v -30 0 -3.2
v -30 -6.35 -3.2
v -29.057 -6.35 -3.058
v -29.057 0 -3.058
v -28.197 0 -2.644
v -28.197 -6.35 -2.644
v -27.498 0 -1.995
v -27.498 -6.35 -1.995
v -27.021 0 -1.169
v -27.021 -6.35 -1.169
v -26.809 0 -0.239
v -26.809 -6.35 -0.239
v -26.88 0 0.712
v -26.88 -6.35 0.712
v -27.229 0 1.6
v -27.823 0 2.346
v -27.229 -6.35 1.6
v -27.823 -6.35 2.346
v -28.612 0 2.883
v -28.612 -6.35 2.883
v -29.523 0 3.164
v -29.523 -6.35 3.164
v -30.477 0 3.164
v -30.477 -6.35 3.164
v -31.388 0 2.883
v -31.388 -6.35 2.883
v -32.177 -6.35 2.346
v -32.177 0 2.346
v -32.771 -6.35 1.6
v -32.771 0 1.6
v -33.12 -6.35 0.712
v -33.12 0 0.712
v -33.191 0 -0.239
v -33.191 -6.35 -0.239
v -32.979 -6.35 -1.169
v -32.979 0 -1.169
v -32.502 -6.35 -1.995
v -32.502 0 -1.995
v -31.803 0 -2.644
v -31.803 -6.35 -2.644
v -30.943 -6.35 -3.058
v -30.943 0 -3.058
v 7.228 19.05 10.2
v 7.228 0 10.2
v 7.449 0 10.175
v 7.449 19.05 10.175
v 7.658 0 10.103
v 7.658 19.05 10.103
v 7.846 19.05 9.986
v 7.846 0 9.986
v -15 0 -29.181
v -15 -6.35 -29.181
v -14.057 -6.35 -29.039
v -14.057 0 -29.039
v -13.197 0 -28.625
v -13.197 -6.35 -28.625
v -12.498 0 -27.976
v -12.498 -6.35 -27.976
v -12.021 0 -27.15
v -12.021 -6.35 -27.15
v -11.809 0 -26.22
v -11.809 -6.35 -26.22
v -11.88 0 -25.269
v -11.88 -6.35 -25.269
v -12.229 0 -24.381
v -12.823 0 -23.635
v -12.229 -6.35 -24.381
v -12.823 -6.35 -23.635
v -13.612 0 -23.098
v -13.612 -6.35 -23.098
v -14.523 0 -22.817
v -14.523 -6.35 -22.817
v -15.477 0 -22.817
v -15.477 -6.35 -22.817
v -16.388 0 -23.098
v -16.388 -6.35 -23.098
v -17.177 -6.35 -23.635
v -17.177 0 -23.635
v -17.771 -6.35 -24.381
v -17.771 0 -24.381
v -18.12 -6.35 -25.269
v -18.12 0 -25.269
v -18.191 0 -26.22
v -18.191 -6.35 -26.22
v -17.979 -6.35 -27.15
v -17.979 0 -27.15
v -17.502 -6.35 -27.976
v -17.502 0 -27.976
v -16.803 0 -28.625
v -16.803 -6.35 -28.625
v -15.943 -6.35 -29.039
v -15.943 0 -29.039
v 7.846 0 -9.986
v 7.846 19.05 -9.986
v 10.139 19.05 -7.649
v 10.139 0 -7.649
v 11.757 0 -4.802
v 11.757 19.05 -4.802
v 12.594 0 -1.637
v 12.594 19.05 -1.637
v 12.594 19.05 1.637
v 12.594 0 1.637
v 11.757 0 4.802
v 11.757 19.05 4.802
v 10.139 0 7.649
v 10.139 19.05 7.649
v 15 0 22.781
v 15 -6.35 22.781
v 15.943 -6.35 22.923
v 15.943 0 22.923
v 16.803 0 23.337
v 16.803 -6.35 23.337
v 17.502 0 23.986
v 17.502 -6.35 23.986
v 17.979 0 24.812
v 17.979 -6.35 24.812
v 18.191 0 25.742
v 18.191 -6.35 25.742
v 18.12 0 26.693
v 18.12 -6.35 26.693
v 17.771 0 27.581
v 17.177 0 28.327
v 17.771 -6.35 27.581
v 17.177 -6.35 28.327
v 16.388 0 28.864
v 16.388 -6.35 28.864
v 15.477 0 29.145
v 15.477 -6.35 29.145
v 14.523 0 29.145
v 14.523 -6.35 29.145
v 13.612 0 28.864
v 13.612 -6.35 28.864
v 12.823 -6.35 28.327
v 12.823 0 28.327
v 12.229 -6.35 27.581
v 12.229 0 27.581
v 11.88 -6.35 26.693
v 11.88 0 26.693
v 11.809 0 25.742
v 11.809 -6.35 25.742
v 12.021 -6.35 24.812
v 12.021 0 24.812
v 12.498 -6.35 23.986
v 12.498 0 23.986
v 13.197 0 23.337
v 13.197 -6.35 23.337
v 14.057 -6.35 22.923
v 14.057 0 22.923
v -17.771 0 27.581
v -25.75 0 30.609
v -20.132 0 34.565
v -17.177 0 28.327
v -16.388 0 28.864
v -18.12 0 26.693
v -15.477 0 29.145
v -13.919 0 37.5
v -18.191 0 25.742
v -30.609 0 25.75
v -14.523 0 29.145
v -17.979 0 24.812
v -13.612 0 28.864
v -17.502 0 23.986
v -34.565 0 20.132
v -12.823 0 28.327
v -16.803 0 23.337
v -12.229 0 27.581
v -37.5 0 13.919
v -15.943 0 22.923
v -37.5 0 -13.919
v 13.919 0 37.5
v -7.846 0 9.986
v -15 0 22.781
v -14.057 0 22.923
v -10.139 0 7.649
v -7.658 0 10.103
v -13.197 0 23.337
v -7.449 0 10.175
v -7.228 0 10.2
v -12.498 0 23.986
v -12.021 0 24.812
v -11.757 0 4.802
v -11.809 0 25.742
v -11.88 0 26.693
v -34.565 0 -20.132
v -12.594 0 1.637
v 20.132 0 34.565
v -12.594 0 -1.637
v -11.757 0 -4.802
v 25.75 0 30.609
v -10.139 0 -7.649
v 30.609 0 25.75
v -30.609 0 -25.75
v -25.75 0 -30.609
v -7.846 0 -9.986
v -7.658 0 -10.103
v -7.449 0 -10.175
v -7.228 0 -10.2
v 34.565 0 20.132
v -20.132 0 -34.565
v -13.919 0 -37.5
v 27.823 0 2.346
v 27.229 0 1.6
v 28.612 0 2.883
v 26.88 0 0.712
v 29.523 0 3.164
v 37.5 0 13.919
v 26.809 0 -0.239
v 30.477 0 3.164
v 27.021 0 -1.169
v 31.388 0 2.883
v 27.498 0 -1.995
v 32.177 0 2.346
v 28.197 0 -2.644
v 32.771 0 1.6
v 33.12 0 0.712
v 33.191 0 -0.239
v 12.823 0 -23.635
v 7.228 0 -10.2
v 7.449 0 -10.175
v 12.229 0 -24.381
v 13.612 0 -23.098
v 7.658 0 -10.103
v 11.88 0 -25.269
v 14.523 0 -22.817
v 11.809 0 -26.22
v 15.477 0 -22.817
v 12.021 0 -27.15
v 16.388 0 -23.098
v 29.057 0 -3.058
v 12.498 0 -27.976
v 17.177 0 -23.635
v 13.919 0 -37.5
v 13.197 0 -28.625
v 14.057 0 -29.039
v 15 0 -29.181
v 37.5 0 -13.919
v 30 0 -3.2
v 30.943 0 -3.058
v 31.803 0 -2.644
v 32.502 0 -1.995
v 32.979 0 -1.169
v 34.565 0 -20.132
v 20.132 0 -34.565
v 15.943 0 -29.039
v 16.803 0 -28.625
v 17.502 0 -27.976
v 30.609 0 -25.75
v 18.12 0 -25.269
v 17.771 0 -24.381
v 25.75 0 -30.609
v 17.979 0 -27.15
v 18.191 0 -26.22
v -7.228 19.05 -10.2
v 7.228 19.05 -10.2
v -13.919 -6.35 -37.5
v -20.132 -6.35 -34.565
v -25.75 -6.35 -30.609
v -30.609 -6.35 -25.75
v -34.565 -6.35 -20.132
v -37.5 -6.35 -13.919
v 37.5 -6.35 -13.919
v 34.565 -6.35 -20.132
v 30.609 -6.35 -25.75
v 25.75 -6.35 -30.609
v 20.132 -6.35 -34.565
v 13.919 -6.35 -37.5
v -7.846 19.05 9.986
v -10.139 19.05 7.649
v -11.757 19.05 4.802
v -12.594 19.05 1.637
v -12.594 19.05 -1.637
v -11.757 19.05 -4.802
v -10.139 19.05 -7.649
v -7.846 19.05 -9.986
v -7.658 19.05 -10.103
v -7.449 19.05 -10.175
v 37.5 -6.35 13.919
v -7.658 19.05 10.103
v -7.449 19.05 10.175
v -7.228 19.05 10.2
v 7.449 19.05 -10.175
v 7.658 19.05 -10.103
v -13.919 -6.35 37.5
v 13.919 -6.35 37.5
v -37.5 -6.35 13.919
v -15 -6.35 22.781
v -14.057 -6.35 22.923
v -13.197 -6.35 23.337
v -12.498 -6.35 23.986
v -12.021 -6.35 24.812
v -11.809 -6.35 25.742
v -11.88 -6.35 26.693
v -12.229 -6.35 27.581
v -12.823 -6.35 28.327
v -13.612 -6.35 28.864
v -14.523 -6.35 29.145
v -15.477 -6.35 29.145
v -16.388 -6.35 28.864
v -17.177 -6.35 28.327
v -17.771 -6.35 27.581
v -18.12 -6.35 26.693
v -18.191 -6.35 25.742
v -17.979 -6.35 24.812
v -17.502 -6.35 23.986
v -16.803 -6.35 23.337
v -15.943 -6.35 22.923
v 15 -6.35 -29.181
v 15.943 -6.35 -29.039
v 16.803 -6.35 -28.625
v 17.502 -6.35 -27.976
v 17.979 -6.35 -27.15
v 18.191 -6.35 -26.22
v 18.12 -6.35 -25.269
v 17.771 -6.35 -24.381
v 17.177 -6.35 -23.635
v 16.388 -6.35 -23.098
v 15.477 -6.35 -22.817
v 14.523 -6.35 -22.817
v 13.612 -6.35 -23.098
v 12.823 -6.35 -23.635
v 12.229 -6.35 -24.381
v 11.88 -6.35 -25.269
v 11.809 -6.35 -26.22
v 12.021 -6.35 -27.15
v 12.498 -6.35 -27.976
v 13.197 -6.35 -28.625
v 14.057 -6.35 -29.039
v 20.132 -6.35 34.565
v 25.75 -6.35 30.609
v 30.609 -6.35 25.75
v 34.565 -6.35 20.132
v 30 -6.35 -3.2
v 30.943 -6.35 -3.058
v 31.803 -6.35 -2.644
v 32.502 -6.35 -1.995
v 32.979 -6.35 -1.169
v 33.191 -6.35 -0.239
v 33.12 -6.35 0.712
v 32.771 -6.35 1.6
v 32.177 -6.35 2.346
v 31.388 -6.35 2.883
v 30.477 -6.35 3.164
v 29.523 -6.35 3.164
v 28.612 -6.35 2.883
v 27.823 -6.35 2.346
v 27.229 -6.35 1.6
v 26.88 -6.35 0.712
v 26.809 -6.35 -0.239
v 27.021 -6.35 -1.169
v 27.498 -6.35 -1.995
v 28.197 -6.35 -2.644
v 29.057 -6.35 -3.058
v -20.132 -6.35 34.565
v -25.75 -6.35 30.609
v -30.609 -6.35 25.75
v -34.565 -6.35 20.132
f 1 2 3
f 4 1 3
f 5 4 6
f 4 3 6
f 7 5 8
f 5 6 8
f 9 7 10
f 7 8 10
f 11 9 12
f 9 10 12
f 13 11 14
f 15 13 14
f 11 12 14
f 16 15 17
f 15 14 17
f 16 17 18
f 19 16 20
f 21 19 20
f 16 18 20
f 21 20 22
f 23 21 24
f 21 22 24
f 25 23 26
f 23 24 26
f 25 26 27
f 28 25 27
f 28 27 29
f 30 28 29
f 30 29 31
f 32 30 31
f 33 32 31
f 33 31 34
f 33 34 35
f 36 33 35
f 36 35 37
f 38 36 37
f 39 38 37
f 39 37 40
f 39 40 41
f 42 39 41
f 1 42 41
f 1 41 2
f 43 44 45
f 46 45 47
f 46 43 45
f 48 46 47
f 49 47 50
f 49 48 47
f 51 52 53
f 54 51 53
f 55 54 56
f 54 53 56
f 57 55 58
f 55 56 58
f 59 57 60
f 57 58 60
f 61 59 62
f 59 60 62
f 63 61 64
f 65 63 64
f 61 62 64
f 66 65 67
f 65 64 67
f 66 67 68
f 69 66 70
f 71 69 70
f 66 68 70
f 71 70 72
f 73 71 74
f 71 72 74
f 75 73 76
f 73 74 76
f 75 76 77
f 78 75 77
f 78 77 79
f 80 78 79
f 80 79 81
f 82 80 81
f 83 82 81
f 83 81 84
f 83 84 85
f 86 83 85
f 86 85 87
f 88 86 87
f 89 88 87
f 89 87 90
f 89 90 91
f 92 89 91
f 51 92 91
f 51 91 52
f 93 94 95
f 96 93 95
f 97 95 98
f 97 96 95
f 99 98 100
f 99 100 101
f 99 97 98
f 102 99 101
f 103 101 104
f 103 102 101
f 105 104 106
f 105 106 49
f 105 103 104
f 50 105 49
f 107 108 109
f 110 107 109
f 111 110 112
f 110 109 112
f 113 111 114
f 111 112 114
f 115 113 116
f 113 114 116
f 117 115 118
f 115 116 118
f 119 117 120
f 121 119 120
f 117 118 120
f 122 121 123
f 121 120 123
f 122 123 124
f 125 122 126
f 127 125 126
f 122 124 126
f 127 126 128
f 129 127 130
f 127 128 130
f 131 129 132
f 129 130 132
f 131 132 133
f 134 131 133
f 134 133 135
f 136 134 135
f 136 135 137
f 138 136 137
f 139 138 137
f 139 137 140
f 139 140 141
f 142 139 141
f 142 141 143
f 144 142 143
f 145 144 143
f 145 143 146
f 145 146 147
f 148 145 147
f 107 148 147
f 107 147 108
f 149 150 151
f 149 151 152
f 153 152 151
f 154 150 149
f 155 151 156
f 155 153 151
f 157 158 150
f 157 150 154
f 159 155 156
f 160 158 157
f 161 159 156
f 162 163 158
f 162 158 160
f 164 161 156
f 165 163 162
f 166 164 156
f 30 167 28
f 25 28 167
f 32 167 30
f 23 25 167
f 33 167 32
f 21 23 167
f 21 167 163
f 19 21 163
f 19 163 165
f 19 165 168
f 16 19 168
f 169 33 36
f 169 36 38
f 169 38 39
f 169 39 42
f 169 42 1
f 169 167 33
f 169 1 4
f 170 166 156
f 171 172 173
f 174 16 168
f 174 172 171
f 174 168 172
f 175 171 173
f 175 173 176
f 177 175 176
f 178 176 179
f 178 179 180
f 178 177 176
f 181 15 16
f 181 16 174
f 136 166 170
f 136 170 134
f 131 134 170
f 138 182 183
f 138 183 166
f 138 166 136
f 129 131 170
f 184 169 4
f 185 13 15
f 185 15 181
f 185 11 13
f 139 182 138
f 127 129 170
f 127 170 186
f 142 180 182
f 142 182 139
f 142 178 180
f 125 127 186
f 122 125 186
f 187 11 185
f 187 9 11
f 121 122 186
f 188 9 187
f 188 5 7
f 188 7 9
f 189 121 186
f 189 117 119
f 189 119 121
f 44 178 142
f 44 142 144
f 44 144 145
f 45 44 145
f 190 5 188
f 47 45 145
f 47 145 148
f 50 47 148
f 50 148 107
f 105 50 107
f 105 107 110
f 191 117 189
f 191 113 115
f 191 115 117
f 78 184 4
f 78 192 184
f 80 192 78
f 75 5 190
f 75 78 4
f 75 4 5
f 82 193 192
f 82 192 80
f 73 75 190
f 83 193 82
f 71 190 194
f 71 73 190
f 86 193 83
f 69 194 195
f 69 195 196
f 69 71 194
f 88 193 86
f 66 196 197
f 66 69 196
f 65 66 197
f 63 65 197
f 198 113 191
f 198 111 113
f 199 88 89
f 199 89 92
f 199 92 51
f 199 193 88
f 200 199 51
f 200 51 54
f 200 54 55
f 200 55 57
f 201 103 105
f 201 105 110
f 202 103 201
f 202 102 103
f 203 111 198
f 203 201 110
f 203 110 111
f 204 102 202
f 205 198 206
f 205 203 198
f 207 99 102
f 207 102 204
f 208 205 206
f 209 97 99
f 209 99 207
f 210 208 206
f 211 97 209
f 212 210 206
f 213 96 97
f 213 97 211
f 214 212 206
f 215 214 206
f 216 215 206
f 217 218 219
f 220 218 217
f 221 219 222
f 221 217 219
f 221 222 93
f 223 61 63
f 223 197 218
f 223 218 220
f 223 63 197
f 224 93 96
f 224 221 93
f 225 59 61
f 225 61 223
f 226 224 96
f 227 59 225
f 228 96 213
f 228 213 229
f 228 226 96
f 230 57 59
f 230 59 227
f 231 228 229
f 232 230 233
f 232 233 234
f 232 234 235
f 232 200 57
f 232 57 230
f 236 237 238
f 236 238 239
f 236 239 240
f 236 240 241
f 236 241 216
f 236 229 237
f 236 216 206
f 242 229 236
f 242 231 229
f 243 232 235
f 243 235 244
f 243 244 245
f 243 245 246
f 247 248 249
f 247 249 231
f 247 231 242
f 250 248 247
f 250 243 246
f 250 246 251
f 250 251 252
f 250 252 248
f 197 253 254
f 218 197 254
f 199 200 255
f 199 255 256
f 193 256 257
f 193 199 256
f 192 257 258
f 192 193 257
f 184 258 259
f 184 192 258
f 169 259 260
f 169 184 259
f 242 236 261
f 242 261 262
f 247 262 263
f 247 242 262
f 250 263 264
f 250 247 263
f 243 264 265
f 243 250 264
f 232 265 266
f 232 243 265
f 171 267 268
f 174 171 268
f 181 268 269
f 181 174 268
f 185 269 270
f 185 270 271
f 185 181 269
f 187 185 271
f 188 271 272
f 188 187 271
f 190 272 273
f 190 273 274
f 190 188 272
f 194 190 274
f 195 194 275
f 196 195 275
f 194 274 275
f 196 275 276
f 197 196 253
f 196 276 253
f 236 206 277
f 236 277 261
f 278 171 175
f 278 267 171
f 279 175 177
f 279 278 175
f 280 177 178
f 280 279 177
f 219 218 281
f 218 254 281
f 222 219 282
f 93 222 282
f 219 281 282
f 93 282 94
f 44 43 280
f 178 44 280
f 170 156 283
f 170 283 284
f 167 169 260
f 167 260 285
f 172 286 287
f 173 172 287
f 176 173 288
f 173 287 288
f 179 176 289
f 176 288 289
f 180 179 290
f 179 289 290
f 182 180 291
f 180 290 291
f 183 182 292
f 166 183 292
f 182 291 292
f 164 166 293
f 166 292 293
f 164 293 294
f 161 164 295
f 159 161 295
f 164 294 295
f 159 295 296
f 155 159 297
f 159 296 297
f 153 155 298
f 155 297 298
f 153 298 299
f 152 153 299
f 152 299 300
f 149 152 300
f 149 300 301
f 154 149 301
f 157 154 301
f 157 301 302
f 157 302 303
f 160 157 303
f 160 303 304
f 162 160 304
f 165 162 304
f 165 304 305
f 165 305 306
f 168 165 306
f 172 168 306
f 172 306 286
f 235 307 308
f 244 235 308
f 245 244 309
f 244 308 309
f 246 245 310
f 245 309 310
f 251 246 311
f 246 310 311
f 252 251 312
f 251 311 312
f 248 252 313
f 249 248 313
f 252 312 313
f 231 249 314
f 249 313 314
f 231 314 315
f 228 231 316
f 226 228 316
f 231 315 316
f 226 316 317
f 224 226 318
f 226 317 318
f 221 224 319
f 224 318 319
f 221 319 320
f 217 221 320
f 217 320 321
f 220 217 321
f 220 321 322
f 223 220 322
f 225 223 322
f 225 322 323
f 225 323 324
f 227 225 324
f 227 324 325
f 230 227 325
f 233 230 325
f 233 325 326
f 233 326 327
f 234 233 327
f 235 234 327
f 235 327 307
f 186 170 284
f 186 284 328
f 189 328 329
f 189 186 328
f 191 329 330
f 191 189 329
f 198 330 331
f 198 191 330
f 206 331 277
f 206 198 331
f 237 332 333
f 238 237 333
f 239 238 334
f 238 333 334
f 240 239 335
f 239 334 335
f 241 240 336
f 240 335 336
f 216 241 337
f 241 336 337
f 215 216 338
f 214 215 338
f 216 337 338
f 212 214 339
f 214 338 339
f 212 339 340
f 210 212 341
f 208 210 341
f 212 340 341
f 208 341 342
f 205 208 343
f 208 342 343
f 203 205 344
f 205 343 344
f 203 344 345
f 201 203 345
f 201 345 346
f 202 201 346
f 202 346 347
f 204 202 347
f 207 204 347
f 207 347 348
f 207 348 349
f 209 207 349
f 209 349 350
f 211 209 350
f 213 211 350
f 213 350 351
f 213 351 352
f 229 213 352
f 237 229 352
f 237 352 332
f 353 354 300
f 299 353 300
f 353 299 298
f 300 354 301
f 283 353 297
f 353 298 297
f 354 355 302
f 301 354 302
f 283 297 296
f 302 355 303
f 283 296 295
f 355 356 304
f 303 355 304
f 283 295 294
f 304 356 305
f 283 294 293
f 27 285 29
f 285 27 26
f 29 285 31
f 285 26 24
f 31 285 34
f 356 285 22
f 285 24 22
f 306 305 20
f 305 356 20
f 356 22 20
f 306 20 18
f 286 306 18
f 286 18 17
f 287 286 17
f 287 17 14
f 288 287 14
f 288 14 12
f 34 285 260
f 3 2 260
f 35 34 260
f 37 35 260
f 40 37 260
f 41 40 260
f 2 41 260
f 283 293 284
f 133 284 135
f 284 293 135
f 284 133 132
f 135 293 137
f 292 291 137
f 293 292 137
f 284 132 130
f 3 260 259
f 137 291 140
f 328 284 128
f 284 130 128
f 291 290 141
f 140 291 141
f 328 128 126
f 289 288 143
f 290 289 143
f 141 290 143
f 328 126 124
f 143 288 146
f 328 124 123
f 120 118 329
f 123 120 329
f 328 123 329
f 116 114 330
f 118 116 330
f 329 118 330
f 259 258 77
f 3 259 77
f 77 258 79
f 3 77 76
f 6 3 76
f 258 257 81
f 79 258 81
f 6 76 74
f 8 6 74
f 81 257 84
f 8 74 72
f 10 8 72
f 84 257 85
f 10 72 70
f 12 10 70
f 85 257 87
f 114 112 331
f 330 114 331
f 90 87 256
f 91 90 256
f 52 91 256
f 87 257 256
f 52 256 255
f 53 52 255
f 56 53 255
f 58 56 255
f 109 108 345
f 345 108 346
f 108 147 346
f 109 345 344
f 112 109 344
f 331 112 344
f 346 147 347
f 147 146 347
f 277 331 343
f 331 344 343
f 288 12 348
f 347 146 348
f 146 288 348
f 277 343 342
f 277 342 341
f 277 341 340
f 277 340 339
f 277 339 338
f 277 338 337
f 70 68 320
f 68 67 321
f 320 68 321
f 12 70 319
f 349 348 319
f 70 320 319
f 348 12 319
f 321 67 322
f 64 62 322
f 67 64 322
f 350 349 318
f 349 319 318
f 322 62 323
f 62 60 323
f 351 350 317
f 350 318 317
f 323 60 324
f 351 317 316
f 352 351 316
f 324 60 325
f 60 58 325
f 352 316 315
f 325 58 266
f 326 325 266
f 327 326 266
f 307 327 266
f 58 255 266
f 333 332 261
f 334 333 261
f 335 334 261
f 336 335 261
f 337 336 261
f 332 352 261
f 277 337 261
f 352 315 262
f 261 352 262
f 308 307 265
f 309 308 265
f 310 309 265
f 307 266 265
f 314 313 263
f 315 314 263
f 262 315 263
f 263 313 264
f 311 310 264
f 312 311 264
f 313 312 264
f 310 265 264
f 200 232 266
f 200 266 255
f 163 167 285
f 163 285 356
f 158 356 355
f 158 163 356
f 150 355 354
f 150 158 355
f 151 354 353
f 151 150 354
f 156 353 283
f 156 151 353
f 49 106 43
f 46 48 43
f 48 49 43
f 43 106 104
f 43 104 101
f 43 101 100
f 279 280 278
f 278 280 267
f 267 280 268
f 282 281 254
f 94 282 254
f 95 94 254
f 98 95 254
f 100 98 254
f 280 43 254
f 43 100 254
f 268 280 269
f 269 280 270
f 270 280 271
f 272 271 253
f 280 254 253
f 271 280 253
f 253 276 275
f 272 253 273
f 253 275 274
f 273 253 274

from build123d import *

# Parameters (mm, degrees)
BOSS_EXTRUDE1_DEPTH  = 19.05
BOSS_EXTRUDE2_DEPTH  = 6.35
M6_CLEARANCE_HOLE1_D = 6.4
FILLET1_R            = 1


with BuildPart() as part:
    # Sketch1 → Boss-Extrude1 (new body)
    with BuildSketch(Plane(origin=(0, 0, 0), x_dir=(1, 0, 0), z_dir=(0, 1, 0))):
        with BuildLine():
            Line((-7.566372975, 10.2), (7.566372975, 10.2))
            ThreePointArc((7.566372975, 10.2), (12.7, 0), (7.566372975, -10.2))
            Line((7.566372975, -10.2), (-7.566372975, -10.2))
            ThreePointArc((-7.566372975, -10.2), (-12.7, 0), (-7.566372975, 10.2))
        make_face()
    extrude(amount=BOSS_EXTRUDE1_DEPTH)

    # Sketch1<4> → Boss-Extrude2 (add)
    with BuildSketch(Plane(origin=(0, 0, 0), x_dir=(1, 0, 0), z_dir=(0, 1, 0))):
        with BuildLine():
            Line((13.919410907, 37.5), (-13.919410907, 37.5))
            ThreePointArc((-13.919410907, 37.5), (-28.284271247, 28.284271247), (-37.5, 13.919410907))
            Line((-37.5, 13.919410907), (-37.5, -13.919410907))
            ThreePointArc((-37.5, -13.919410907), (-28.284271247, -28.284271247), (-13.919410907, -37.5))
            Line((-13.919410907, -37.5), (13.919410907, -37.5))
            ThreePointArc((13.919410907, -37.5), (28.284271247, -28.284271247), (37.5, -13.919410907))
            Line((37.5, -13.919410907), (37.5, 13.919410907))
            ThreePointArc((37.5, 13.919410907), (28.284271247, 28.284271247), (13.919410907, 37.5))
        make_face()
    extrude(amount=-BOSS_EXTRUDE2_DEPTH)

    # M6 Clearance Hole1 (through all)
    with Locations(Plane(origin=(-30, 0, 0), x_dir=(0, 0, 1), z_dir=(0, 1, 0))):
        with Locations((0, 0), (-25.980762114, 15), (-25.980762114, 45), (0, 60), (25.980762114, 45), (25.980762114, 15)):
            Hole(M6_CLEARANCE_HOLE1_D / 2)

    # Fillet1
    fillet1_edges = [part.edges().sort_by_distance(p)[0] for p in [
        (-7.566372975, 9.525, 10.2),
        (-7.566372975, 9.525, -10.2),
        (7.566372975, 9.525, -10.2),
        (7.566372975, 9.525, 10.2),
    ]]
    fillet(fillet1_edges, radius=FILLET1_R)


solid = part.part
